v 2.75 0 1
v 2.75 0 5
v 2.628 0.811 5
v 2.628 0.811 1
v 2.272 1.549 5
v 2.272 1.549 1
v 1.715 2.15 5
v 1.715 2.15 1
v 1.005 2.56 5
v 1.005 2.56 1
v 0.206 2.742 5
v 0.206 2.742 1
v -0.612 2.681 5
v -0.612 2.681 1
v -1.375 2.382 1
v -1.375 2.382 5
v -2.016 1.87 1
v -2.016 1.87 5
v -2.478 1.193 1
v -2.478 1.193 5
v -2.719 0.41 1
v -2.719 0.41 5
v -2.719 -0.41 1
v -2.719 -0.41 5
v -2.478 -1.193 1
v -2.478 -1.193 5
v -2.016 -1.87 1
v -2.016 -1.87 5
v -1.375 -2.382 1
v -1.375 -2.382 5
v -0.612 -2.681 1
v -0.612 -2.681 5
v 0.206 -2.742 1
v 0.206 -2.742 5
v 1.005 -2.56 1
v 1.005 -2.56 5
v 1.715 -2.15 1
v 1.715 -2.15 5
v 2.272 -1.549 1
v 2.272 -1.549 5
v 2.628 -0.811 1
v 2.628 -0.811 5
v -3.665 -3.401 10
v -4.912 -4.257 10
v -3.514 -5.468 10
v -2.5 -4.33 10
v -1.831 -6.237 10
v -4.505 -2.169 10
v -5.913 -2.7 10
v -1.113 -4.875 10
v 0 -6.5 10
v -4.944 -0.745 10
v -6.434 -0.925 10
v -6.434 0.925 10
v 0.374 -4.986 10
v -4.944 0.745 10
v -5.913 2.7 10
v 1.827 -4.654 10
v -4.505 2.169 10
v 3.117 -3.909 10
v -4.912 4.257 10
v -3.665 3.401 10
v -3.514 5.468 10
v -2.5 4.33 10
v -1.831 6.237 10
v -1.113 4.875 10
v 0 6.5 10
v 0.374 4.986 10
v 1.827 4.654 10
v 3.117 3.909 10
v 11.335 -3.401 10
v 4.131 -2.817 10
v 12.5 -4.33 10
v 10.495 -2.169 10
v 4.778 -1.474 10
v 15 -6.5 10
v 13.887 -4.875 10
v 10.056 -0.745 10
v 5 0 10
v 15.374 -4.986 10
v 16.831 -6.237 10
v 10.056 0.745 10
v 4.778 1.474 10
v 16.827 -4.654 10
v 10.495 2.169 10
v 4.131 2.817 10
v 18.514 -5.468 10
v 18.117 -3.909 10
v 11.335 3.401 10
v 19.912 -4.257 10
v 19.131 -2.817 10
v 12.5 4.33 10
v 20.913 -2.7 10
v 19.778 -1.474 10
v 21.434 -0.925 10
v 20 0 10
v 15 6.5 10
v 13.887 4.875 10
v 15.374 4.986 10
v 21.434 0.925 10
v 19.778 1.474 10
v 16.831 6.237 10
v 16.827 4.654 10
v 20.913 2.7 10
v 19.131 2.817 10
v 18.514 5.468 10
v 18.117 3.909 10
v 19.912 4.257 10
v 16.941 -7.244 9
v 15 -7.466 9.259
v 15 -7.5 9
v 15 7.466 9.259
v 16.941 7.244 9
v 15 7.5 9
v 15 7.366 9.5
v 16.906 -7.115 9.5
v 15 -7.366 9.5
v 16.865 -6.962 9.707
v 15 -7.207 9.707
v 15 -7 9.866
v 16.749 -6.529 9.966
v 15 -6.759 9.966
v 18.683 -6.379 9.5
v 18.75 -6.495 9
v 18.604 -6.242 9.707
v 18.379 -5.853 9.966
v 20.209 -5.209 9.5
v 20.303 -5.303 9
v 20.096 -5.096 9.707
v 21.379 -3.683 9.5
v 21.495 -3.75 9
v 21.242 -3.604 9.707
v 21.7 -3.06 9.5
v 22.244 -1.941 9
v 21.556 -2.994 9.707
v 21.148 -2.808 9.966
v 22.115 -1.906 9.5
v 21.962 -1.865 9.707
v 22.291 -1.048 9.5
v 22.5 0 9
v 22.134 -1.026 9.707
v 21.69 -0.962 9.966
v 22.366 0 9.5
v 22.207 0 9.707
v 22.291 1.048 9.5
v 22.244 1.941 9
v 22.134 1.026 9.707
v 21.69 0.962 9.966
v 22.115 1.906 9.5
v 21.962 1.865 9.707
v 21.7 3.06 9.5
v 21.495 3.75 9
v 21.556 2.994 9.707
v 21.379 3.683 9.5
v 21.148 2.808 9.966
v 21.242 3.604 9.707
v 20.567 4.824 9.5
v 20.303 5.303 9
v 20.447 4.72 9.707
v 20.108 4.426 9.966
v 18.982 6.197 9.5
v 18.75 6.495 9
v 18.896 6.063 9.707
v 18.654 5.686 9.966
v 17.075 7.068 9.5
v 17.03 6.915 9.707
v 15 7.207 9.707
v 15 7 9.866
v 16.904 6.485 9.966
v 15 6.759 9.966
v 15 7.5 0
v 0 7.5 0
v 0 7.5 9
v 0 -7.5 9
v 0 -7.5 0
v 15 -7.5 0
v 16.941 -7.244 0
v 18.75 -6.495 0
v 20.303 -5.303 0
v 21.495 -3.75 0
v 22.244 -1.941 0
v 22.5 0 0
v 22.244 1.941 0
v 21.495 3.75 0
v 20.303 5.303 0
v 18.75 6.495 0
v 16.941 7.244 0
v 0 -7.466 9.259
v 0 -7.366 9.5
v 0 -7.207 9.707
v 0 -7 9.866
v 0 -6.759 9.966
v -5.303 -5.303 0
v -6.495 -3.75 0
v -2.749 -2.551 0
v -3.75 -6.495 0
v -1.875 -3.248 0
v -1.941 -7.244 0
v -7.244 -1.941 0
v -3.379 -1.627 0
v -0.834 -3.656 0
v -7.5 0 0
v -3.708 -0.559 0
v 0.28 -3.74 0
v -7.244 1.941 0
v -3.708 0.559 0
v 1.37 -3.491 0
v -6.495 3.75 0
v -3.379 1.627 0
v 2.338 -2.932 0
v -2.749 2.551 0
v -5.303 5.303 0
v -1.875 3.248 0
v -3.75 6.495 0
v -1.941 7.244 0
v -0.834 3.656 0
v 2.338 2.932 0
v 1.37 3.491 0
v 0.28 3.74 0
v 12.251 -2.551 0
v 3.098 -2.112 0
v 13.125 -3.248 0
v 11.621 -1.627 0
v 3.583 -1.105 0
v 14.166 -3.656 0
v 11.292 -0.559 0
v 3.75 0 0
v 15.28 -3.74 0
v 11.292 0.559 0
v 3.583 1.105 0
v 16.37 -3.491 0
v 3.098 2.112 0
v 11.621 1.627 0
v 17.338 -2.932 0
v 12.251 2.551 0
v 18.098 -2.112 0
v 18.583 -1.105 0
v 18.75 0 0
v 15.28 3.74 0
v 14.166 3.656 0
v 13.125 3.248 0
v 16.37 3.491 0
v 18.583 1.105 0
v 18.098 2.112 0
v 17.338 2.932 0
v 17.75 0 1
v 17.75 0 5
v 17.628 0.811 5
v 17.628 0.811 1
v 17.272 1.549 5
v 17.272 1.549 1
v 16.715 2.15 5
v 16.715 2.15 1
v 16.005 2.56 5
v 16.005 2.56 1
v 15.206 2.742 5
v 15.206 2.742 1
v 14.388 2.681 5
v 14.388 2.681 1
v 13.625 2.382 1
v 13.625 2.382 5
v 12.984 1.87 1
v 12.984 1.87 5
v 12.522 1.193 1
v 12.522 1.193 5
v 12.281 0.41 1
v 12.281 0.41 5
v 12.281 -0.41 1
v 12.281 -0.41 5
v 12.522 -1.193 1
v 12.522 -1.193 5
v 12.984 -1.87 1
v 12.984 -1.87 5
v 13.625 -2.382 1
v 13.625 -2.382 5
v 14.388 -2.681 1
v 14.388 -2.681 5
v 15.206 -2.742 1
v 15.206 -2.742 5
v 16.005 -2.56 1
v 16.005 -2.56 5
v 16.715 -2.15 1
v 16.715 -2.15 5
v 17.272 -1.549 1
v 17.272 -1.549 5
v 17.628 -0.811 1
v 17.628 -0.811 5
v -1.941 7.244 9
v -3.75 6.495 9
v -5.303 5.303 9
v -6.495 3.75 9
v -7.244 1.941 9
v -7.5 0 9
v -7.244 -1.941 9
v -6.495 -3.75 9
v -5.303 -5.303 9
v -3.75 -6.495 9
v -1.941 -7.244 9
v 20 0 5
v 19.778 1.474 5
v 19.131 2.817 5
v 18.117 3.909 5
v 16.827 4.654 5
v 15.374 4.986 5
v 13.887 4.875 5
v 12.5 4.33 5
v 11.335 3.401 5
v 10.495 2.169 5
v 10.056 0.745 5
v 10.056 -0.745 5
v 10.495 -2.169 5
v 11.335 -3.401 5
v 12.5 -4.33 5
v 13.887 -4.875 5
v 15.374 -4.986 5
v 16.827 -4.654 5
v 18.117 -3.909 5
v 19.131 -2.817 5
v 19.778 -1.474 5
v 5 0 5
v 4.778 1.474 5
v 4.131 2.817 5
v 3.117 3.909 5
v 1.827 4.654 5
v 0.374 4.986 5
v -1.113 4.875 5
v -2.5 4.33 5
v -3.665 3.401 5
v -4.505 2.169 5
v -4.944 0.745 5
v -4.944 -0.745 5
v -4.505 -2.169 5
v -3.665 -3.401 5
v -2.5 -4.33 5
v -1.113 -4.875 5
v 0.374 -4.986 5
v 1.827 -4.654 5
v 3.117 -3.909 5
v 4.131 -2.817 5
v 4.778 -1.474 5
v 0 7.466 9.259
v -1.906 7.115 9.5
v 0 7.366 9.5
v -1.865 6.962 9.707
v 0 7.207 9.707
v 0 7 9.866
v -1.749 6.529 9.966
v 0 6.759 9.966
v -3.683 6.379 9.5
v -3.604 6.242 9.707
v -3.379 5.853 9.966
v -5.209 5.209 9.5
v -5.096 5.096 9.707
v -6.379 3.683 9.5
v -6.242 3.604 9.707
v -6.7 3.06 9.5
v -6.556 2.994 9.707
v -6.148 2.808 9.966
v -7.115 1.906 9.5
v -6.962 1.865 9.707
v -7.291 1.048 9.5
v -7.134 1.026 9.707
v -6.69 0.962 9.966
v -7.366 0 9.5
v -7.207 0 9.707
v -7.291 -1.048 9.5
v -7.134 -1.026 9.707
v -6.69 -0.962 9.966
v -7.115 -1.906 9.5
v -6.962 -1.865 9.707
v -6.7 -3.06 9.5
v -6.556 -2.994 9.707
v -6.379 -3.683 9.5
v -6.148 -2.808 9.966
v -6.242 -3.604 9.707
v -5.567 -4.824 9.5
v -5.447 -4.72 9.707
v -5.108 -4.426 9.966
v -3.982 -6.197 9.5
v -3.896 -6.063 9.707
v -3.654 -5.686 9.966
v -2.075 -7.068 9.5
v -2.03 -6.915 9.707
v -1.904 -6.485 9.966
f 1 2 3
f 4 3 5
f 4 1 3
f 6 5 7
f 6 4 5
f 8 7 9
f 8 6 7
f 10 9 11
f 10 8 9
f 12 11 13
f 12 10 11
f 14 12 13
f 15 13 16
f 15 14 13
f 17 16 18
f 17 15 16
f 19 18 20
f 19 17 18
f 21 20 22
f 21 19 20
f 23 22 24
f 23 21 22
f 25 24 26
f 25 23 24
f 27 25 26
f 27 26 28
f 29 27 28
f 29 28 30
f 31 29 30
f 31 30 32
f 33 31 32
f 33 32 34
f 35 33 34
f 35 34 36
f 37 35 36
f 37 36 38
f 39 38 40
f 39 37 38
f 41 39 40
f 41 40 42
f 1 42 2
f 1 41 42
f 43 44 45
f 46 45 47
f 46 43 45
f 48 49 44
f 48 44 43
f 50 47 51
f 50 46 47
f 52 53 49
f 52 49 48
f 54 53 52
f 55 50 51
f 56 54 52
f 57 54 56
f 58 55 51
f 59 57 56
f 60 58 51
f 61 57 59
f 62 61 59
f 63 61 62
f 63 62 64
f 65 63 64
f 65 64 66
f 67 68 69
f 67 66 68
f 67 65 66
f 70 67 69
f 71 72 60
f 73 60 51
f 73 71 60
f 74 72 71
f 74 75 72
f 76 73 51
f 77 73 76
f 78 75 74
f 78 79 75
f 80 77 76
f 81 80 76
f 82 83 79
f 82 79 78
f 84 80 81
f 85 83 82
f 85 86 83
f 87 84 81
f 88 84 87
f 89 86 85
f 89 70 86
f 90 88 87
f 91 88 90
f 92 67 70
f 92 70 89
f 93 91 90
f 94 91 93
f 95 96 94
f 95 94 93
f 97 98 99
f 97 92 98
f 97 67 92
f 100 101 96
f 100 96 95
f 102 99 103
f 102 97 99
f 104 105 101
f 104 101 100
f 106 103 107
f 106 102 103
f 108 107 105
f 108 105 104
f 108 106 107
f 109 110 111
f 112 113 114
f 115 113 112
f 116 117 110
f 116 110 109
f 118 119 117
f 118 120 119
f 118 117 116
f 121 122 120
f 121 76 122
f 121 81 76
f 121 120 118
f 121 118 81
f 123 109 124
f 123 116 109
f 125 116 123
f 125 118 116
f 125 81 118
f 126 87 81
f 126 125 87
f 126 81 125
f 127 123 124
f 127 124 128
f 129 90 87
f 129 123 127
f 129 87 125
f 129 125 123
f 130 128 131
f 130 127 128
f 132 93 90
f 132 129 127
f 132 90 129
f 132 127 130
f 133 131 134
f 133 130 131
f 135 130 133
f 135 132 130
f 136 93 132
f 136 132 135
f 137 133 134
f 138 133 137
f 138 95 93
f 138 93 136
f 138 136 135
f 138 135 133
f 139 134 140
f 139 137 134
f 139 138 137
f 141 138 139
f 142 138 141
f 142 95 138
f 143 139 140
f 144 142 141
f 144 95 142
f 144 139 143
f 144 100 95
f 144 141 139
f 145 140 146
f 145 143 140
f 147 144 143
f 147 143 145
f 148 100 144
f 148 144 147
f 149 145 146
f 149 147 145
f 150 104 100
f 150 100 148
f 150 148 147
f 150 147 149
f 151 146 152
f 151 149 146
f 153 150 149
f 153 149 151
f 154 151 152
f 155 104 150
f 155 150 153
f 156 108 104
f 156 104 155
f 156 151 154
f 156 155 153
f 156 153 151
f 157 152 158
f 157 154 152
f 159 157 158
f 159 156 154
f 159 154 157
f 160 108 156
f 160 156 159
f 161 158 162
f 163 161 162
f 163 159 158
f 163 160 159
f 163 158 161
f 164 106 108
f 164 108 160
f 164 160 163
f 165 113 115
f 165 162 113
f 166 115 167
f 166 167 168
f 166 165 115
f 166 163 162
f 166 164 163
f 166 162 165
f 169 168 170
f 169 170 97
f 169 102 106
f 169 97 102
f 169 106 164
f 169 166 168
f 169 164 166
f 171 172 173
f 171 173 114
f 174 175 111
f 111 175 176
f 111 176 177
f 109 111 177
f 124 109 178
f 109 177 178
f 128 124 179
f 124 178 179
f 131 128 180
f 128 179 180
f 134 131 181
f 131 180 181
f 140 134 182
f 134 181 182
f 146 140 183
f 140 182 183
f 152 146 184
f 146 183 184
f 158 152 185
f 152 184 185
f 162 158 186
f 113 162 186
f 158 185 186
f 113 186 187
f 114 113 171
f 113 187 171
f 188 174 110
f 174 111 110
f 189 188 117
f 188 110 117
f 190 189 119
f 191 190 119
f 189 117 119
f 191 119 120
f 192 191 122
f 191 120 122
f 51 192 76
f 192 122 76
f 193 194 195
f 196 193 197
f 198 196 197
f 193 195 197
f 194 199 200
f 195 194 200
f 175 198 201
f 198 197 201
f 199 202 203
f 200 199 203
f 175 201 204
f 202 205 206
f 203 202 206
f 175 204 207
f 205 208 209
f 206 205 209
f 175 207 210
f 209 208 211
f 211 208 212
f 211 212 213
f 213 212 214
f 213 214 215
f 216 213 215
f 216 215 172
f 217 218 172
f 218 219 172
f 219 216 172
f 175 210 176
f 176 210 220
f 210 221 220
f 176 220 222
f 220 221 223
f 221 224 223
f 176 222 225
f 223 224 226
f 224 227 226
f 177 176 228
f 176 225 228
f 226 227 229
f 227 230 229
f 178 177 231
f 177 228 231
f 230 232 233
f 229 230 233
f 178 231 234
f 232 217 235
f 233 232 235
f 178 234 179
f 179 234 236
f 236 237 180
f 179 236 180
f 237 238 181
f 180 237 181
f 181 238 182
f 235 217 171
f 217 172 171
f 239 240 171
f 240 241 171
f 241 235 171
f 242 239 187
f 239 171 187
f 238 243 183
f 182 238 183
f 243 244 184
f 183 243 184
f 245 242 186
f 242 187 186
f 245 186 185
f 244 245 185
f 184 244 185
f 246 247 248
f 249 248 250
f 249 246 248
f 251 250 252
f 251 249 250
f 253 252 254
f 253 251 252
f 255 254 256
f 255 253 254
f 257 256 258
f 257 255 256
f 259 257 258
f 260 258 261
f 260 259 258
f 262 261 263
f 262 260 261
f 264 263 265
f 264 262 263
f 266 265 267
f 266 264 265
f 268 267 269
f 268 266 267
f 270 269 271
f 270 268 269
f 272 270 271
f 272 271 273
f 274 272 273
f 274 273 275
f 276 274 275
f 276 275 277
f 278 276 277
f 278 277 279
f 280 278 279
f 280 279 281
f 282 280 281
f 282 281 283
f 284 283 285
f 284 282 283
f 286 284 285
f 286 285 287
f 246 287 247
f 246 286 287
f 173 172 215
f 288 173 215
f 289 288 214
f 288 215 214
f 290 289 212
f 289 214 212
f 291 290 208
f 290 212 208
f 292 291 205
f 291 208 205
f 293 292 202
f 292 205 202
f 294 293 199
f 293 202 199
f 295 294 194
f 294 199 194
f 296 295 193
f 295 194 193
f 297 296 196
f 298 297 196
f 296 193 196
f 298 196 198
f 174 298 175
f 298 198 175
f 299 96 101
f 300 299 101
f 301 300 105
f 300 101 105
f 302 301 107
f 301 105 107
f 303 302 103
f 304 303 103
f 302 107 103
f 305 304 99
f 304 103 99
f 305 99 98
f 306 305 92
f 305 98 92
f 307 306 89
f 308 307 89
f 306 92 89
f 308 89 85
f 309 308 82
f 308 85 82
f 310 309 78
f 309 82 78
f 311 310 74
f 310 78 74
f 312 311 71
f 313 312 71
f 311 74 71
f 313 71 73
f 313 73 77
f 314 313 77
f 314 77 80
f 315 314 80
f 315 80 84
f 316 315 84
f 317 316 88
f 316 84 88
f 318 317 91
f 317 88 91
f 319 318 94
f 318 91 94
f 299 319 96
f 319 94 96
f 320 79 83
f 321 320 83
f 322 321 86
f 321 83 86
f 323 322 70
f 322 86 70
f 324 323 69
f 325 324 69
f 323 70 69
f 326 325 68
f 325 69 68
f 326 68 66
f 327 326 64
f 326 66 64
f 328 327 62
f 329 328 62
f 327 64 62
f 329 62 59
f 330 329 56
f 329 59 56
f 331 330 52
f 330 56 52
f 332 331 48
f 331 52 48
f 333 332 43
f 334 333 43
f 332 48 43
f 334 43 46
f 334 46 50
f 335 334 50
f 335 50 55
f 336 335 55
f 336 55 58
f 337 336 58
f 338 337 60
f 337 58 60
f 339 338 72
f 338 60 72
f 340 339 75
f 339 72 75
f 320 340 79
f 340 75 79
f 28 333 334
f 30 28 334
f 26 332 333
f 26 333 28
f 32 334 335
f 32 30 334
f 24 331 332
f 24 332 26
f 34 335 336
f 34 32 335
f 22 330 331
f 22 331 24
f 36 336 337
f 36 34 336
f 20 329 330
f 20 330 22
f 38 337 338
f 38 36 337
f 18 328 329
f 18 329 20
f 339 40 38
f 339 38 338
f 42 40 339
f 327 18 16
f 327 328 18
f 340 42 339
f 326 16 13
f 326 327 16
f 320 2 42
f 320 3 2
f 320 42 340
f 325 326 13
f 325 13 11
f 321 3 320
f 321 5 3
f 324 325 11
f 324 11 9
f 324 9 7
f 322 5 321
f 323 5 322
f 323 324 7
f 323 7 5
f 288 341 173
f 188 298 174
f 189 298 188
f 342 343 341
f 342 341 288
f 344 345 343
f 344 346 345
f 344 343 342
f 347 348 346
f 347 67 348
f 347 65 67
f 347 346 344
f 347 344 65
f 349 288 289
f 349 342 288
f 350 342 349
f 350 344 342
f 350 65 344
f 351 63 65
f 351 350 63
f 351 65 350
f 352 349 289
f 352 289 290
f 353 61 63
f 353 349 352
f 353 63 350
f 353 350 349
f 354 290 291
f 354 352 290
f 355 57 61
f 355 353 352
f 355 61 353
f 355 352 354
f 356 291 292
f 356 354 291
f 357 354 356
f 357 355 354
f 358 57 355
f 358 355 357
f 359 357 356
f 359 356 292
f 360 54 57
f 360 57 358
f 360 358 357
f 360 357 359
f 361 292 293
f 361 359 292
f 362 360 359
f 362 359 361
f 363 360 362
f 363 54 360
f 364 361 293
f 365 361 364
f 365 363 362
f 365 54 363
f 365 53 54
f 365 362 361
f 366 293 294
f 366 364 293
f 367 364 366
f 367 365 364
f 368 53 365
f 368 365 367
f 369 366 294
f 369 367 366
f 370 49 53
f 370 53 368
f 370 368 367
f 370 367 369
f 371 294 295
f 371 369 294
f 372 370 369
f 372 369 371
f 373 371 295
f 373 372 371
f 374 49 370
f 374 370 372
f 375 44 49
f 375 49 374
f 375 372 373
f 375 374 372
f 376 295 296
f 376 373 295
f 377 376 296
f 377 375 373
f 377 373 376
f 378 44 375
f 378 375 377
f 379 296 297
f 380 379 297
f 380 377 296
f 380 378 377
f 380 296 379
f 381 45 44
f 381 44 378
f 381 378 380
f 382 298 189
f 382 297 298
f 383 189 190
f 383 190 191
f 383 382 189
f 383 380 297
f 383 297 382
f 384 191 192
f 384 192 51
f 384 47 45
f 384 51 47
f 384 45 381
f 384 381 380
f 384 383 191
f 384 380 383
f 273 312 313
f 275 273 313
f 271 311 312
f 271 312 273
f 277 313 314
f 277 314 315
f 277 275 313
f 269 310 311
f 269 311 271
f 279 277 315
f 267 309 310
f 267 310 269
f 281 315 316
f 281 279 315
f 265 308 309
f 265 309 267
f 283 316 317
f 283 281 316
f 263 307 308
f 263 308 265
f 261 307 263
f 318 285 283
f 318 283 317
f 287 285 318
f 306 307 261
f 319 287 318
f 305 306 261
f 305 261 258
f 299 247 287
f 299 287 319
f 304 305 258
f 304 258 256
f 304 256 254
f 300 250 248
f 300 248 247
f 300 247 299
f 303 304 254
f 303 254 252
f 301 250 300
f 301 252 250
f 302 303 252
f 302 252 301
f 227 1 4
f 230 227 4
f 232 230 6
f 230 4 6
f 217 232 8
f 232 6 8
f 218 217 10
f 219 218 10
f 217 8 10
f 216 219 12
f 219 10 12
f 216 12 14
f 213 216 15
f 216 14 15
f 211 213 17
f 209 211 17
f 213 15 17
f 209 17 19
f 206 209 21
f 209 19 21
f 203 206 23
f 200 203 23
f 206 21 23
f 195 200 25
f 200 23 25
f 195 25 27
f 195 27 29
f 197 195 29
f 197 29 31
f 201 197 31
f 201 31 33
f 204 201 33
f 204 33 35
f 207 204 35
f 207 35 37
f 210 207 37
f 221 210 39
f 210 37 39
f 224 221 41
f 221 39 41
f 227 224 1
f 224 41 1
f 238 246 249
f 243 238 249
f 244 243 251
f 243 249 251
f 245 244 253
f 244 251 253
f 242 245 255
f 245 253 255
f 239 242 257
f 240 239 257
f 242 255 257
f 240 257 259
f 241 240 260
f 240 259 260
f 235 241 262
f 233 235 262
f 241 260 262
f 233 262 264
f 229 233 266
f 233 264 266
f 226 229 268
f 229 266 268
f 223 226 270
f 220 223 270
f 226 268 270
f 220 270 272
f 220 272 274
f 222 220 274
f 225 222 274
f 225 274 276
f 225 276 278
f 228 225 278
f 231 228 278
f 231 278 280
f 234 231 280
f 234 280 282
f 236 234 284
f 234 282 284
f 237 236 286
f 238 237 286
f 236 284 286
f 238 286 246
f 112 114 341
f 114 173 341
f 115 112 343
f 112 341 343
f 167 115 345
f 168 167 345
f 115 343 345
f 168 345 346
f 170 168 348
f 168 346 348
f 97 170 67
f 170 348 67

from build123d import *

# Parameters (mm, degrees)
SKETCH_R     = 2.75
PAD_DEPTH    = 10
FILLET_R     = 1
CHAMFER_SIZE = 1
SKETCH001_R  = 5
POCKET_DEPTH = 5


with BuildPart() as part:
    # Sketch → Pad (new body)
    with BuildSketch(Plane.XY):
        with BuildLine():
            ThreePointArc((0, 7.5), (-7.5, 0), (0, -7.5))
            Line((0, -7.5), (15, -7.5))
            ThreePointArc((15, -7.5), (22.5, 0), (15, 7.5))
            Line((0, 7.5), (15, 7.5))
        make_face()
        Circle(SKETCH_R, mode=Mode.SUBTRACT)
        with Locations((15, 0)):
            Circle(SKETCH_R, mode=Mode.SUBTRACT)
    extrude(amount=PAD_DEPTH)

    # Fillet
    fillet_edges = [part.edges().sort_by_distance(p)[0] for p in [
        (7.5, -7.5, 10),
    ]]
    fillet(fillet_edges, radius=FILLET_R)

    # Chamfer
    chamfer_edges = [part.edges().sort_by_distance(p)[0] for p in [
        (12.25, 0, 0),
        (-2.75, 0, 0),
    ]]
    chamfer(chamfer_edges, length=CHAMFER_SIZE)

    # Sketch001 (on Face14 of Chamfer) → Pocket (cut)
    with BuildSketch(Plane.XY.offset(10)):
        Circle(SKETCH001_R)
        with Locations((15, 0)):
            Circle(SKETCH001_R)
    extrude(amount=-POCKET_DEPTH, mode=Mode.SUBTRACT)


solid = part.part
